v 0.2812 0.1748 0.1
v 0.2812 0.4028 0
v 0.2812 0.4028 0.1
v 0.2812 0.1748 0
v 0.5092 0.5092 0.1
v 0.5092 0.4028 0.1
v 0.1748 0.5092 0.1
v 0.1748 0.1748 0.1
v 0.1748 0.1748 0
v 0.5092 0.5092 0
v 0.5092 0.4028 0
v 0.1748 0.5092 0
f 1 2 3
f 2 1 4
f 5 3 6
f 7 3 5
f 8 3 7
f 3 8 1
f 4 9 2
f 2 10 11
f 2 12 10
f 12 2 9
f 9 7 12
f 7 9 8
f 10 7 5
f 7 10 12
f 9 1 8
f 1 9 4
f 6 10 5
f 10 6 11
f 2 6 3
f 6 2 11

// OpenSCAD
use <../../../scad_include/routing.scad>

px = 7.6e-3;
layer = 10e-3;

module serpentine_25px_0(xpos, ypos, zpos, orientation){
    
    // Sub-modules
    module obj(){
        translate([23*px, 23*px, 0])       
        routing(
            dimm = [
                    [[0, 0], [0, 14*px], [0, 10*layer]],
                    [[0, 14*px], [0, 0], [0, 10*layer]]
                    ],
            p0 = [0, 0, 0],
            pf = [
                    ["+yx", [30*px, 30*px+14*px], [1, 0]]
                    ]
        );
        
    }
    
    if (orientation == "N"){
        translate([xpos*px, ypos*px, zpos*layer])
        obj();
    }
        if (orientation == "FN"){
        mirror([1, 0, 0])
        translate([-3*30*px - xpos*px, ypos*px, zpos*layer])
        obj();
    }
    if (orientation == "FS"){
        mirror([0, 1, 0])
        translate([xpos*px, -3*30*px - ypos*px, zpos*layer])
        obj();
    }
    if (orientation == "S"){
        mirror([0, 1, 0])
        mirror([1, 0, 0])
        translate([-3*30*px - xpos*px, -3*30*px - ypos*px, zpos*layer])
        obj();
    }
    
}

serpentine_25px_0(0,0,0,"N");
